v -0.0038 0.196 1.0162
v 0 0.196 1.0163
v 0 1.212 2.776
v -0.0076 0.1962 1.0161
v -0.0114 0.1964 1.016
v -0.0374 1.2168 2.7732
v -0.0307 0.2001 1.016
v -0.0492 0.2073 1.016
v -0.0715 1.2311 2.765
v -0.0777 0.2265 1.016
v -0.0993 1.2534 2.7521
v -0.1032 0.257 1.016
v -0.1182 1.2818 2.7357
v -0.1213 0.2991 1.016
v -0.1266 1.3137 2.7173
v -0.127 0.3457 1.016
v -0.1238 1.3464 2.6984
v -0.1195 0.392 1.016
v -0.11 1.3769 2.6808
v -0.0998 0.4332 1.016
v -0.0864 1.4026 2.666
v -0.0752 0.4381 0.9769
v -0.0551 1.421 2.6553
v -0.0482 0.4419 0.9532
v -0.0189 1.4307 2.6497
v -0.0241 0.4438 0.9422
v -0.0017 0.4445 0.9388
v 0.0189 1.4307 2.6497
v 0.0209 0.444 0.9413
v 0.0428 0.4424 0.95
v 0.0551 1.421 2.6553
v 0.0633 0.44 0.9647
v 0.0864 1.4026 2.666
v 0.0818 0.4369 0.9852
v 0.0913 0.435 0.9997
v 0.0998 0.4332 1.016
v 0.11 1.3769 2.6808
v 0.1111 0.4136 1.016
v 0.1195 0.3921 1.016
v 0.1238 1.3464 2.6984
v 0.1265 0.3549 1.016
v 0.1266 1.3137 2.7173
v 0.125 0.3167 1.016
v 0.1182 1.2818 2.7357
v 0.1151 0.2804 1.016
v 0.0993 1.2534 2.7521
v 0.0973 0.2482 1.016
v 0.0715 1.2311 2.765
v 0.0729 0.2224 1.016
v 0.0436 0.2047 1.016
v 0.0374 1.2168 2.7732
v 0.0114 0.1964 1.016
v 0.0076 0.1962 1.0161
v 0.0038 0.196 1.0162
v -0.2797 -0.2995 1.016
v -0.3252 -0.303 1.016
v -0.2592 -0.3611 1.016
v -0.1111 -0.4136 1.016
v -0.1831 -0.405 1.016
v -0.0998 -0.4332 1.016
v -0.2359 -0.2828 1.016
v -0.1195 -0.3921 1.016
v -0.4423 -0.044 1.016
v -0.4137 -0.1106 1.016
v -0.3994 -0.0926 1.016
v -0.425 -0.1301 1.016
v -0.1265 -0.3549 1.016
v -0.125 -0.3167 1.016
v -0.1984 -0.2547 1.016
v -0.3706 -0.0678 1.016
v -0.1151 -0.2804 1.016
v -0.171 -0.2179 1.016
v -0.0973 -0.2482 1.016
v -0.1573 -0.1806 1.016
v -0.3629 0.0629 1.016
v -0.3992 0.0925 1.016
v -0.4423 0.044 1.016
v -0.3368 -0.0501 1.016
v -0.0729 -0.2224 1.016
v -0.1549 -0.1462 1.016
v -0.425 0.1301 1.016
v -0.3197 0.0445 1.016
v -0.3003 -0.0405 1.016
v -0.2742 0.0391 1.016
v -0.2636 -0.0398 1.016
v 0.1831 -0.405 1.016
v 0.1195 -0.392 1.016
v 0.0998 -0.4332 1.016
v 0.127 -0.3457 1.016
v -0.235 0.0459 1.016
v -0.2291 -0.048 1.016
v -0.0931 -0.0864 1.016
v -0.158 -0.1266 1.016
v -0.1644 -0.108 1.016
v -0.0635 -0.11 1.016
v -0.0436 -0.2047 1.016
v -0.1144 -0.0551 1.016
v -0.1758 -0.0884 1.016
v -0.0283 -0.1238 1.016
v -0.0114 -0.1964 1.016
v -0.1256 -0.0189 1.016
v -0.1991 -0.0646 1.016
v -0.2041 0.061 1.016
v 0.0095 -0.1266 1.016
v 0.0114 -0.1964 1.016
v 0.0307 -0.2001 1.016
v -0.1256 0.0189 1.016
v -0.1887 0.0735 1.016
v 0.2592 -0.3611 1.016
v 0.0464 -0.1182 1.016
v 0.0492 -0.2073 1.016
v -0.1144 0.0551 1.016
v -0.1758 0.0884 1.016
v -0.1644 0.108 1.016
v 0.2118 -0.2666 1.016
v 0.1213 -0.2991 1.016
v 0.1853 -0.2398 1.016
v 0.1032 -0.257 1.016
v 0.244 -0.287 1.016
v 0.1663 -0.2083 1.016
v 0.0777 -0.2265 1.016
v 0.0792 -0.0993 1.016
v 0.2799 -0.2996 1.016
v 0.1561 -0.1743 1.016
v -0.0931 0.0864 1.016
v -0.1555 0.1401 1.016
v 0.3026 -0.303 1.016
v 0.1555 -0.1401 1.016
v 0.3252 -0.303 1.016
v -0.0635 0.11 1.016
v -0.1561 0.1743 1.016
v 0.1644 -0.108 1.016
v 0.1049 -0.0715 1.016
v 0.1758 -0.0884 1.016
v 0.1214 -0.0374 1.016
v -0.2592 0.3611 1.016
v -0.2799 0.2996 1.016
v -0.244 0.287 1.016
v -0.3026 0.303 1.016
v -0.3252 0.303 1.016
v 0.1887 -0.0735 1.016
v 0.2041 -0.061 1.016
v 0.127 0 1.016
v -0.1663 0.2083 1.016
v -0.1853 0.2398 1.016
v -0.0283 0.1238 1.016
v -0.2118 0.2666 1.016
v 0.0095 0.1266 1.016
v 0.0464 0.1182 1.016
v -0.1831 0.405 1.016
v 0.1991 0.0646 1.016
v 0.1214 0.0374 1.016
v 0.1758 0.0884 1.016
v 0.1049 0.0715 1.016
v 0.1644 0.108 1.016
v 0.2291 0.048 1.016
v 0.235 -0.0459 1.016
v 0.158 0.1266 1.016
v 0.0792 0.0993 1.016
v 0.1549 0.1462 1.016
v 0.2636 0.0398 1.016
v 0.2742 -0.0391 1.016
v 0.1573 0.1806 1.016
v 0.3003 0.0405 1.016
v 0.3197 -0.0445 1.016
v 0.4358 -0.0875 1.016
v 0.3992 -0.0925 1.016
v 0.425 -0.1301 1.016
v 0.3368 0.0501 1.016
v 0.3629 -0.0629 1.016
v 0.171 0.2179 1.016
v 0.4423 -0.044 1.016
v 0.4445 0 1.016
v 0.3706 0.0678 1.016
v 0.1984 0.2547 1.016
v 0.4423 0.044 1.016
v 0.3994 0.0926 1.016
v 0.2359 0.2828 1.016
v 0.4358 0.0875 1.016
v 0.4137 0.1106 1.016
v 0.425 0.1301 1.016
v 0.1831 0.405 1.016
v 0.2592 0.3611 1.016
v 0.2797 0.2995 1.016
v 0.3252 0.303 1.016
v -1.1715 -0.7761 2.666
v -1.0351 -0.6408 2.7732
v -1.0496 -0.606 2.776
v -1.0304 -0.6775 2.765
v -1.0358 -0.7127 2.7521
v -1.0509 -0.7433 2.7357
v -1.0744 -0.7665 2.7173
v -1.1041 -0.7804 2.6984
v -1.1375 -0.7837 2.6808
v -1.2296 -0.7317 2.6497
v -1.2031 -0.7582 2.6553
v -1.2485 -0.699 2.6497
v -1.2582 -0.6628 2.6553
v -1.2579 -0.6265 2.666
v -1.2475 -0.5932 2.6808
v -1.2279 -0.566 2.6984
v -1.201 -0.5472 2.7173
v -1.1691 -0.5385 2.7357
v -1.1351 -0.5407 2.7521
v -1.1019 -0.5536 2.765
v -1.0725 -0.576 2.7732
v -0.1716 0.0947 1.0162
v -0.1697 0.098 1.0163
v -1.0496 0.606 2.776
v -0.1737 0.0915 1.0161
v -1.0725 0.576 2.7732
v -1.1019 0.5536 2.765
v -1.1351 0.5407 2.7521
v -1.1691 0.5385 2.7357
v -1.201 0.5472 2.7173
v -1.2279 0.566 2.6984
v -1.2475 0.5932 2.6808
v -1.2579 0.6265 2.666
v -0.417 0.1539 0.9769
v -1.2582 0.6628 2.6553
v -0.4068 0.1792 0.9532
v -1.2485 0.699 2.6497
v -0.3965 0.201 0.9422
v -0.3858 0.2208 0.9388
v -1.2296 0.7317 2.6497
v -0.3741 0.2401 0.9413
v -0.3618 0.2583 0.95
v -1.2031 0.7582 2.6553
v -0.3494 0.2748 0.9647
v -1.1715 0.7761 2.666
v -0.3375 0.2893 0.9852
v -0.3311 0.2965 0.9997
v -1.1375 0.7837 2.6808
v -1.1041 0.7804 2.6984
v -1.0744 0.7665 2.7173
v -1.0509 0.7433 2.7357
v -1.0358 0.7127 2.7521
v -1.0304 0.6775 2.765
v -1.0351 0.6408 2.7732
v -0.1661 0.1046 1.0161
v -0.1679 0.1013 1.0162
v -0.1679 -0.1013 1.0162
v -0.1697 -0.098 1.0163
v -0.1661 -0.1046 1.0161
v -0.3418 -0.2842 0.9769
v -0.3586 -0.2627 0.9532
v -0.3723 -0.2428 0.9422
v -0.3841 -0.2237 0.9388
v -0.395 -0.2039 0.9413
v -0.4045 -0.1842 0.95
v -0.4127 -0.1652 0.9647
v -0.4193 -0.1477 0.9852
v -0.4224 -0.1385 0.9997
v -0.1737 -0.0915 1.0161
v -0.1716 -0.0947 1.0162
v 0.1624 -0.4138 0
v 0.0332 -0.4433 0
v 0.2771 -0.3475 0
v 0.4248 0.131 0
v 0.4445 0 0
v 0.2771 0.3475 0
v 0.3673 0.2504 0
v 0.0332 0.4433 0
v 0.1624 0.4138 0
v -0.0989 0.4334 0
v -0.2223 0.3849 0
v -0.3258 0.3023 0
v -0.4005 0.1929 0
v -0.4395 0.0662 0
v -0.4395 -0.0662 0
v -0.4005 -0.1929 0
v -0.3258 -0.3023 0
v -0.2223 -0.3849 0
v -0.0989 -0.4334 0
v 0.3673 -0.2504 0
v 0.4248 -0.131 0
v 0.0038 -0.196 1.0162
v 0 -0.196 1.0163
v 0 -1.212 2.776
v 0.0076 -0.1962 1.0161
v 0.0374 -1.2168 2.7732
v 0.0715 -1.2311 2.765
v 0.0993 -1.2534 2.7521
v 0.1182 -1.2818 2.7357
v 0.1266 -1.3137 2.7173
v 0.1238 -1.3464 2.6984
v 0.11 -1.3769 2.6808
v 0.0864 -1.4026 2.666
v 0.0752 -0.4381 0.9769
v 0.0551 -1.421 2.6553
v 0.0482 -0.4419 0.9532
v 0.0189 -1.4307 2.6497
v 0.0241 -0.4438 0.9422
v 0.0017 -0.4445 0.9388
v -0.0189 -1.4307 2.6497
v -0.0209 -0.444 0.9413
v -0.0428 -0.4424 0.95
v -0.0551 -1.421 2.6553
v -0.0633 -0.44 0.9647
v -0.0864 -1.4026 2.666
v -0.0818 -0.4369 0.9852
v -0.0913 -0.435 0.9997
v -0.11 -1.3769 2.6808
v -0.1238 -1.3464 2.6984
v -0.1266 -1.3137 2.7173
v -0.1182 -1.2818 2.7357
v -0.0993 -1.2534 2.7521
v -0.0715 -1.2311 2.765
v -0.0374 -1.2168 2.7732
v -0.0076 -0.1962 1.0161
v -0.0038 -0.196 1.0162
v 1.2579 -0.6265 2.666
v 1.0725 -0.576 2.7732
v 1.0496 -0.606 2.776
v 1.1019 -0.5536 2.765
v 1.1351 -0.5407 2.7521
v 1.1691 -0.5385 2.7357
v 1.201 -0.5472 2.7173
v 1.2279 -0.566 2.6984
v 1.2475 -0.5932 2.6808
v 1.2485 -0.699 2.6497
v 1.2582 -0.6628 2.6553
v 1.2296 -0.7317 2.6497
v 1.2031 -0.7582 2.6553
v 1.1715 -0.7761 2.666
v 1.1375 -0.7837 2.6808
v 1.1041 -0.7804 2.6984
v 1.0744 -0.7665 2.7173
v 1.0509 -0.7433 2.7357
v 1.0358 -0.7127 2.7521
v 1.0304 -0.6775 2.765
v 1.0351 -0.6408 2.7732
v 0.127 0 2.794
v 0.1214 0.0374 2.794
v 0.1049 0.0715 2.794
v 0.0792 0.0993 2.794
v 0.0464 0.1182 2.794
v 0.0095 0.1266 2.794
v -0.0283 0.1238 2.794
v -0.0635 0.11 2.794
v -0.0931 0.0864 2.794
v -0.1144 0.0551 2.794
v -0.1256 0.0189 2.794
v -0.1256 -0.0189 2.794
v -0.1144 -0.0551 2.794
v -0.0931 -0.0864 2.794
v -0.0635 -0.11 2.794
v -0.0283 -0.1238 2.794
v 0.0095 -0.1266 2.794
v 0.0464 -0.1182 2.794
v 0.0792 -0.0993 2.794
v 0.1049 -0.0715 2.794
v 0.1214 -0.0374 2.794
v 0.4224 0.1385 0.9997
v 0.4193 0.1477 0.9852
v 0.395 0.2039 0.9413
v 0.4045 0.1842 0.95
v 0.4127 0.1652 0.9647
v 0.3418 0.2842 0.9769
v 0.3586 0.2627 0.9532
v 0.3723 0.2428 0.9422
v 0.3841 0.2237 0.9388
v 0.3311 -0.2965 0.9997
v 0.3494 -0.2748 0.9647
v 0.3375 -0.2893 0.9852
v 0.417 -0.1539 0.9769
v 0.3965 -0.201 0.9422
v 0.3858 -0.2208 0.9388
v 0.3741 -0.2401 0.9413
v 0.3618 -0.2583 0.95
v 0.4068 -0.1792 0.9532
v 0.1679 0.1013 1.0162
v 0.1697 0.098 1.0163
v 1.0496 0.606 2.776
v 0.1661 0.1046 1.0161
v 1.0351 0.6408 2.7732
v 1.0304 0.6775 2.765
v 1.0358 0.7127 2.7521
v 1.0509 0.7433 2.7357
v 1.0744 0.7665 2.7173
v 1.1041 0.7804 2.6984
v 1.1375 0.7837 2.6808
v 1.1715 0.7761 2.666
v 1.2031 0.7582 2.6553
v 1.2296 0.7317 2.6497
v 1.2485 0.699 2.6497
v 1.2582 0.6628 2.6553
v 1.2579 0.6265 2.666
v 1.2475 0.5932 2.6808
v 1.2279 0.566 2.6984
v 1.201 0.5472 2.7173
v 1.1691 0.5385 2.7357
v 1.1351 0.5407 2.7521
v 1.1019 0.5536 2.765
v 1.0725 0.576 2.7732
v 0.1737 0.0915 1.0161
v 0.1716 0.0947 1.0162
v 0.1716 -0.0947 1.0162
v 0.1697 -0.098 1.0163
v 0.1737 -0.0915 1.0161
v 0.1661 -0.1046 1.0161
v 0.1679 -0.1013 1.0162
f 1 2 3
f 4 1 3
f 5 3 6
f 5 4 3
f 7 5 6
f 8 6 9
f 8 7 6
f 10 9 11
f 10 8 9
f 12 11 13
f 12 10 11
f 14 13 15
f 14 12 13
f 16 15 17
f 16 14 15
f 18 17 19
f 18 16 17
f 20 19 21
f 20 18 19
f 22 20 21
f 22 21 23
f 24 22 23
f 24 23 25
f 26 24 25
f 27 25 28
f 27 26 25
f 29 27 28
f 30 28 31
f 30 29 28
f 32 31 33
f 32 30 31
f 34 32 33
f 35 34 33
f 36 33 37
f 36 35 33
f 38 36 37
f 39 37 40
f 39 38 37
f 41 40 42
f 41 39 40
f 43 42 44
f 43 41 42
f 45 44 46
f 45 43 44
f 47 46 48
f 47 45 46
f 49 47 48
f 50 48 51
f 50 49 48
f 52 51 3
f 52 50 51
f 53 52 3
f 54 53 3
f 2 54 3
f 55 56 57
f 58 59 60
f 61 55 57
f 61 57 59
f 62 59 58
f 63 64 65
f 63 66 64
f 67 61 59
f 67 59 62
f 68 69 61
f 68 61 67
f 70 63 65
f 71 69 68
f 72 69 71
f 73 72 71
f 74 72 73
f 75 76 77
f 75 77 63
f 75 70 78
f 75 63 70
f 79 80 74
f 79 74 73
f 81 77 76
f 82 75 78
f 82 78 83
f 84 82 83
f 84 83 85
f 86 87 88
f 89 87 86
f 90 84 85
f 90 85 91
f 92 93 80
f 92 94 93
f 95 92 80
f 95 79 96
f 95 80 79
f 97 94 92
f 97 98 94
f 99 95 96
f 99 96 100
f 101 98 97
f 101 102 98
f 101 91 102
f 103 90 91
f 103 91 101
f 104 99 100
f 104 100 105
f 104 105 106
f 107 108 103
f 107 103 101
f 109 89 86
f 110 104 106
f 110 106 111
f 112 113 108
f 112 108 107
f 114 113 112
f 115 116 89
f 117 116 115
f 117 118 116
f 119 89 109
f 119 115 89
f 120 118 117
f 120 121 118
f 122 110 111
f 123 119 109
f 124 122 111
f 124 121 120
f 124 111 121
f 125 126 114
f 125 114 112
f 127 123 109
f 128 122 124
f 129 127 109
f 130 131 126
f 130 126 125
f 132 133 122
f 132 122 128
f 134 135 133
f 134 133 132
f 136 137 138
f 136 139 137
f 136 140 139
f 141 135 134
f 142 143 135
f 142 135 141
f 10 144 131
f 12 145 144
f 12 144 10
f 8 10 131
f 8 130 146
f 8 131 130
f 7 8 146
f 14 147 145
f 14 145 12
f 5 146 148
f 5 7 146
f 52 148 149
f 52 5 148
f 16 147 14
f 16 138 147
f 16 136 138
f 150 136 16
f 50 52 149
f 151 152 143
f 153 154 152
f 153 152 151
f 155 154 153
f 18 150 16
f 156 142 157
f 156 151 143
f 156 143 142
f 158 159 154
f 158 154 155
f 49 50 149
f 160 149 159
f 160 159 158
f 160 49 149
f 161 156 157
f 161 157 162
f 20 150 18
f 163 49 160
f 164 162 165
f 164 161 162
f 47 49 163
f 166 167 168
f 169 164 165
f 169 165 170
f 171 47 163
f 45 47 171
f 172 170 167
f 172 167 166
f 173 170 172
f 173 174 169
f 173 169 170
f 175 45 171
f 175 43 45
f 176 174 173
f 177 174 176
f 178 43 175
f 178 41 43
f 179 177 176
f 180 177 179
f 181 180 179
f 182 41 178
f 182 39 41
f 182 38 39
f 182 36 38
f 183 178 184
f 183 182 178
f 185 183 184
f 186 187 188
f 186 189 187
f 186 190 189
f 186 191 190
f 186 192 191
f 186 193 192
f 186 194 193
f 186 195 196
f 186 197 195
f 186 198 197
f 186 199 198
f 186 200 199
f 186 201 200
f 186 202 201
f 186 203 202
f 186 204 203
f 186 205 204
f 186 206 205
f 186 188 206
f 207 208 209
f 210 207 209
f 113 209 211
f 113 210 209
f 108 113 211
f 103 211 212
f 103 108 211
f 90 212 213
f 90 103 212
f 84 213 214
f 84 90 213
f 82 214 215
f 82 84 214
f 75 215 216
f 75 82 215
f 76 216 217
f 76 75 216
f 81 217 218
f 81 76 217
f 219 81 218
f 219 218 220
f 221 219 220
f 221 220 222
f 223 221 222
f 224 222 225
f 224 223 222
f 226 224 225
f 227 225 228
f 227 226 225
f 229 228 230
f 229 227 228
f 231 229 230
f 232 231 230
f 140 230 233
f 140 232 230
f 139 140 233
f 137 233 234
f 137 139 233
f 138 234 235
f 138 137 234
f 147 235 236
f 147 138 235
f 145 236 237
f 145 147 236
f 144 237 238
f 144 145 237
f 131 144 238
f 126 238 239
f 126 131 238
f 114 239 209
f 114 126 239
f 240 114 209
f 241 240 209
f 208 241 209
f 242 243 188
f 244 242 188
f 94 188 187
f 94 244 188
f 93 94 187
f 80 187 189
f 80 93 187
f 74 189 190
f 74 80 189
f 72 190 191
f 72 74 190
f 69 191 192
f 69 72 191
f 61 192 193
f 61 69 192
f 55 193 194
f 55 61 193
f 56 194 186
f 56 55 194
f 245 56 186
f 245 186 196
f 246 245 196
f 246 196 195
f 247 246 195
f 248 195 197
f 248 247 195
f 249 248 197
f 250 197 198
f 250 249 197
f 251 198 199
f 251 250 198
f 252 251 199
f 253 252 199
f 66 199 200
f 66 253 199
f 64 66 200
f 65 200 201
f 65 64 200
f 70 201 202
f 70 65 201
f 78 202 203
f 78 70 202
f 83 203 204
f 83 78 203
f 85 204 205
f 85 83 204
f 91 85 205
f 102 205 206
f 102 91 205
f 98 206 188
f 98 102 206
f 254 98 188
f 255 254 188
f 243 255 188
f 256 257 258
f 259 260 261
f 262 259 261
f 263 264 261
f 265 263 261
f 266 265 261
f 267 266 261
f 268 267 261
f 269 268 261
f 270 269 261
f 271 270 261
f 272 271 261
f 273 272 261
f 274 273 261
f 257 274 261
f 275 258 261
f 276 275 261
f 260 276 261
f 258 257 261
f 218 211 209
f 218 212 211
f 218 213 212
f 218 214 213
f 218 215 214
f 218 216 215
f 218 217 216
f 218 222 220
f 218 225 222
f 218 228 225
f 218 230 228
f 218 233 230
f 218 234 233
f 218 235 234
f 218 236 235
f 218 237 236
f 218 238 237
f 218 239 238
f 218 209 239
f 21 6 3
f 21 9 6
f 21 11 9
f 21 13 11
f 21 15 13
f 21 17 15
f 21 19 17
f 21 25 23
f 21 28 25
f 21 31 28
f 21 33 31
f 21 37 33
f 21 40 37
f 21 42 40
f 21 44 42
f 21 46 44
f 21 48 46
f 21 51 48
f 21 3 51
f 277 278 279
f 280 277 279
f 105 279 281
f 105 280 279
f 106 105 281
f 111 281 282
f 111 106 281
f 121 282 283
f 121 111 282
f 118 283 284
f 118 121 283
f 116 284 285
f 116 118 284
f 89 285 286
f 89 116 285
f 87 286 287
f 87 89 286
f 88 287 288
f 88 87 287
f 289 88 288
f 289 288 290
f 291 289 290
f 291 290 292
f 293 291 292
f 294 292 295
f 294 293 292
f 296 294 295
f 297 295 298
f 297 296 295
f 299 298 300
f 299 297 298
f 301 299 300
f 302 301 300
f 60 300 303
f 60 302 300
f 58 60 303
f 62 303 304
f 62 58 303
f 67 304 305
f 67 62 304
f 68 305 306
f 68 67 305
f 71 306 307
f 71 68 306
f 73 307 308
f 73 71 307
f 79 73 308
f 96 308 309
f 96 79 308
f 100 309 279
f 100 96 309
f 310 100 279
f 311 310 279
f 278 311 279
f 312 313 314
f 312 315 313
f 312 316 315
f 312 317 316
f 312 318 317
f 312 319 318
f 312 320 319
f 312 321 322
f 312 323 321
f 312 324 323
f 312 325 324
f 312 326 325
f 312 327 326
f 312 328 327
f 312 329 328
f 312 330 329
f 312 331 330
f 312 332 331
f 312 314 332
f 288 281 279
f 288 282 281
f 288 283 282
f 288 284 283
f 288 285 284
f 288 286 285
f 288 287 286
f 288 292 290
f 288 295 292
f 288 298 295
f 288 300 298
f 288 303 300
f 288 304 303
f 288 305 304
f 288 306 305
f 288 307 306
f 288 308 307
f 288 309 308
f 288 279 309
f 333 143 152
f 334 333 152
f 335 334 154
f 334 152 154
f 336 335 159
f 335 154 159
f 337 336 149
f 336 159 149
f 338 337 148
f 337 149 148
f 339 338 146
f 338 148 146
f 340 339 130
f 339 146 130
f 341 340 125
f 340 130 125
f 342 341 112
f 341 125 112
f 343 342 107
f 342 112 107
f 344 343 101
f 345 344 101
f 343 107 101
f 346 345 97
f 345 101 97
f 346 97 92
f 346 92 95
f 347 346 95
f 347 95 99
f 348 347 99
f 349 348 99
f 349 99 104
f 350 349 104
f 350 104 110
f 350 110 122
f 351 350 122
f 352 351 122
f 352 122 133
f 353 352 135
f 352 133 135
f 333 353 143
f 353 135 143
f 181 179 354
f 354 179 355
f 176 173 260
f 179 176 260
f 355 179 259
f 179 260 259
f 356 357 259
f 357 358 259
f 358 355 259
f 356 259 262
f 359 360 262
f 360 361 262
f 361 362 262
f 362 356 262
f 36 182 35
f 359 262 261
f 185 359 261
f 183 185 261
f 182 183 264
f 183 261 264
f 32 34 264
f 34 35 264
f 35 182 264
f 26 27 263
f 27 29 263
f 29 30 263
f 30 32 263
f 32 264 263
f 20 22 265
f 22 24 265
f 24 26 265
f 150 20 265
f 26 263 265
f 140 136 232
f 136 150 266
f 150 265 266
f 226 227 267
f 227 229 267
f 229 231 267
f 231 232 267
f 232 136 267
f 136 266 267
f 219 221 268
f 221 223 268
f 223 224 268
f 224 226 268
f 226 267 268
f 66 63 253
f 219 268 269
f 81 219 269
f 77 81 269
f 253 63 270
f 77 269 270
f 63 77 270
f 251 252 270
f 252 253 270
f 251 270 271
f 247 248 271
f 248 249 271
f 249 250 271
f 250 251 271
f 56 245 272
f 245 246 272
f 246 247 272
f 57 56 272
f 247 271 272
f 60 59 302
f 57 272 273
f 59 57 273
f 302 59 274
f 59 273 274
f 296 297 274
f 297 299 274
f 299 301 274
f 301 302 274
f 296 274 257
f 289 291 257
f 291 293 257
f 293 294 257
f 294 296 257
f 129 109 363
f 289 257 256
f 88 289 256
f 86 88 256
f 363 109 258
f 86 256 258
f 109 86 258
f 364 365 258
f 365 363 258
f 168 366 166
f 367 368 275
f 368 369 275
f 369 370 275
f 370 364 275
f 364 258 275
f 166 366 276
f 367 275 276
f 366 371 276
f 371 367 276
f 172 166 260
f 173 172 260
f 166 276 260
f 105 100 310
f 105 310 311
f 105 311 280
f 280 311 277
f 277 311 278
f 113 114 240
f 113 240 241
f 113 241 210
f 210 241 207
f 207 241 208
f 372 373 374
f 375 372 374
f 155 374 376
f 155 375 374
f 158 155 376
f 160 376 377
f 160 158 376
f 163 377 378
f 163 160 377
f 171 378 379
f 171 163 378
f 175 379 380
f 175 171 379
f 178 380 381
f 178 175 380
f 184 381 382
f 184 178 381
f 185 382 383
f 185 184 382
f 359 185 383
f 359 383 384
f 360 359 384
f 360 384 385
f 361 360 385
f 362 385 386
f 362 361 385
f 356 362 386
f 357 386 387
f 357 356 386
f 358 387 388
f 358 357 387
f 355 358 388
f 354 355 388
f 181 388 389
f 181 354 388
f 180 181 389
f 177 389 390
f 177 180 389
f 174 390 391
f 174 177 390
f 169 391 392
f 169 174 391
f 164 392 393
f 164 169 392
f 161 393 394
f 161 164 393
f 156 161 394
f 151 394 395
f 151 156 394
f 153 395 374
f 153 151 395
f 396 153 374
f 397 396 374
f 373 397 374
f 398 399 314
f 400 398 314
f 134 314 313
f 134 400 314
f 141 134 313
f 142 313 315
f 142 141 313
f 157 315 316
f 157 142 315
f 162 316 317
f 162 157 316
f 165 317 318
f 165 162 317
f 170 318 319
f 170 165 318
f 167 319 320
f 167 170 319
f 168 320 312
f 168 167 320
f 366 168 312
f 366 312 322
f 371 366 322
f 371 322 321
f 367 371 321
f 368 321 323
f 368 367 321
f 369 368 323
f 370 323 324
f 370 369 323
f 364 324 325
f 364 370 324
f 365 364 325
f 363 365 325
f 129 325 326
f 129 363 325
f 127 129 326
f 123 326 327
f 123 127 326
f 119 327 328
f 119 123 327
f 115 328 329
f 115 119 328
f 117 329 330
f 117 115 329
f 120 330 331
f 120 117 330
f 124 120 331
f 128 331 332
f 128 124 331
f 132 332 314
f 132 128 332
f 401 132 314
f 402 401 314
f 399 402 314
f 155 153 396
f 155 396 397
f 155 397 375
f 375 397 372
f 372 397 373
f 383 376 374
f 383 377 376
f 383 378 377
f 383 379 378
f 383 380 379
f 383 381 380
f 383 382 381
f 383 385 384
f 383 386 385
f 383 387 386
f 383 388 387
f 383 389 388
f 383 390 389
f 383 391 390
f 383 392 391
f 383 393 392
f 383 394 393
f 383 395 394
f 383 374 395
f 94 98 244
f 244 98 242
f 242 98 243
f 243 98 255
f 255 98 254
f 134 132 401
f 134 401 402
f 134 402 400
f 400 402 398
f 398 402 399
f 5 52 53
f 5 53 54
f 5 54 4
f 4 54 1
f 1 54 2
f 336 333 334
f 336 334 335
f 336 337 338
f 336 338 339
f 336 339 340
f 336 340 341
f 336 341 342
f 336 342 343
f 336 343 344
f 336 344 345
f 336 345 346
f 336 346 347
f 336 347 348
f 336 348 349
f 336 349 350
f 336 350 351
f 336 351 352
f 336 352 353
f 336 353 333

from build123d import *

# Parameters (mm, degrees)
SKETCH1_R         = 0.4445
EXTRUDE1_DEPTH    = 1.016
SKETCH2_R         = 0.127
EXTRUDE2_DEPTH    = 1.778
CIRPATTERN1_COUNT = 6


with BuildPart() as part:
    # Sketch1 → Extrude1 (new body)
    with BuildSketch(Plane.XY):
        Circle(SKETCH1_R)
    extrude(amount=EXTRUDE1_DEPTH)

    # Sketch2 → Extrude2 (add)
    with BuildSketch(Plane.XY.offset(1.016)):
        Circle(SKETCH2_R)
    extrude(amount=EXTRUDE2_DEPTH)

    # Sketch5 → Revolve1 (revolve)
    with BuildSketch(Plane(origin=(0, 0, 0), x_dir=(0, 0, -1), z_dir=(1, 0, 0))):
        Polygon((-0.889254909, 0.415928891), (-0.952754909, 0.305943665), (-2.712518529, 1.321943665), (-2.649018529, 1.431928891), align=None)
    revolve1 = revolve(axis=Axis((0, 1.321943665, 2.712518529), (0, -0.49999999999998906, -0.866025403784445)))

    # CirPattern1: Revolve1 ×6 about axis
    cirpattern1_axis = Axis((0, 0, 2.794), (0, 0, -1))
    for i in range(1, CIRPATTERN1_COUNT):
        add(revolve1.rotate(cirpattern1_axis, i * 360 / CIRPATTERN1_COUNT))


solid = part.part
